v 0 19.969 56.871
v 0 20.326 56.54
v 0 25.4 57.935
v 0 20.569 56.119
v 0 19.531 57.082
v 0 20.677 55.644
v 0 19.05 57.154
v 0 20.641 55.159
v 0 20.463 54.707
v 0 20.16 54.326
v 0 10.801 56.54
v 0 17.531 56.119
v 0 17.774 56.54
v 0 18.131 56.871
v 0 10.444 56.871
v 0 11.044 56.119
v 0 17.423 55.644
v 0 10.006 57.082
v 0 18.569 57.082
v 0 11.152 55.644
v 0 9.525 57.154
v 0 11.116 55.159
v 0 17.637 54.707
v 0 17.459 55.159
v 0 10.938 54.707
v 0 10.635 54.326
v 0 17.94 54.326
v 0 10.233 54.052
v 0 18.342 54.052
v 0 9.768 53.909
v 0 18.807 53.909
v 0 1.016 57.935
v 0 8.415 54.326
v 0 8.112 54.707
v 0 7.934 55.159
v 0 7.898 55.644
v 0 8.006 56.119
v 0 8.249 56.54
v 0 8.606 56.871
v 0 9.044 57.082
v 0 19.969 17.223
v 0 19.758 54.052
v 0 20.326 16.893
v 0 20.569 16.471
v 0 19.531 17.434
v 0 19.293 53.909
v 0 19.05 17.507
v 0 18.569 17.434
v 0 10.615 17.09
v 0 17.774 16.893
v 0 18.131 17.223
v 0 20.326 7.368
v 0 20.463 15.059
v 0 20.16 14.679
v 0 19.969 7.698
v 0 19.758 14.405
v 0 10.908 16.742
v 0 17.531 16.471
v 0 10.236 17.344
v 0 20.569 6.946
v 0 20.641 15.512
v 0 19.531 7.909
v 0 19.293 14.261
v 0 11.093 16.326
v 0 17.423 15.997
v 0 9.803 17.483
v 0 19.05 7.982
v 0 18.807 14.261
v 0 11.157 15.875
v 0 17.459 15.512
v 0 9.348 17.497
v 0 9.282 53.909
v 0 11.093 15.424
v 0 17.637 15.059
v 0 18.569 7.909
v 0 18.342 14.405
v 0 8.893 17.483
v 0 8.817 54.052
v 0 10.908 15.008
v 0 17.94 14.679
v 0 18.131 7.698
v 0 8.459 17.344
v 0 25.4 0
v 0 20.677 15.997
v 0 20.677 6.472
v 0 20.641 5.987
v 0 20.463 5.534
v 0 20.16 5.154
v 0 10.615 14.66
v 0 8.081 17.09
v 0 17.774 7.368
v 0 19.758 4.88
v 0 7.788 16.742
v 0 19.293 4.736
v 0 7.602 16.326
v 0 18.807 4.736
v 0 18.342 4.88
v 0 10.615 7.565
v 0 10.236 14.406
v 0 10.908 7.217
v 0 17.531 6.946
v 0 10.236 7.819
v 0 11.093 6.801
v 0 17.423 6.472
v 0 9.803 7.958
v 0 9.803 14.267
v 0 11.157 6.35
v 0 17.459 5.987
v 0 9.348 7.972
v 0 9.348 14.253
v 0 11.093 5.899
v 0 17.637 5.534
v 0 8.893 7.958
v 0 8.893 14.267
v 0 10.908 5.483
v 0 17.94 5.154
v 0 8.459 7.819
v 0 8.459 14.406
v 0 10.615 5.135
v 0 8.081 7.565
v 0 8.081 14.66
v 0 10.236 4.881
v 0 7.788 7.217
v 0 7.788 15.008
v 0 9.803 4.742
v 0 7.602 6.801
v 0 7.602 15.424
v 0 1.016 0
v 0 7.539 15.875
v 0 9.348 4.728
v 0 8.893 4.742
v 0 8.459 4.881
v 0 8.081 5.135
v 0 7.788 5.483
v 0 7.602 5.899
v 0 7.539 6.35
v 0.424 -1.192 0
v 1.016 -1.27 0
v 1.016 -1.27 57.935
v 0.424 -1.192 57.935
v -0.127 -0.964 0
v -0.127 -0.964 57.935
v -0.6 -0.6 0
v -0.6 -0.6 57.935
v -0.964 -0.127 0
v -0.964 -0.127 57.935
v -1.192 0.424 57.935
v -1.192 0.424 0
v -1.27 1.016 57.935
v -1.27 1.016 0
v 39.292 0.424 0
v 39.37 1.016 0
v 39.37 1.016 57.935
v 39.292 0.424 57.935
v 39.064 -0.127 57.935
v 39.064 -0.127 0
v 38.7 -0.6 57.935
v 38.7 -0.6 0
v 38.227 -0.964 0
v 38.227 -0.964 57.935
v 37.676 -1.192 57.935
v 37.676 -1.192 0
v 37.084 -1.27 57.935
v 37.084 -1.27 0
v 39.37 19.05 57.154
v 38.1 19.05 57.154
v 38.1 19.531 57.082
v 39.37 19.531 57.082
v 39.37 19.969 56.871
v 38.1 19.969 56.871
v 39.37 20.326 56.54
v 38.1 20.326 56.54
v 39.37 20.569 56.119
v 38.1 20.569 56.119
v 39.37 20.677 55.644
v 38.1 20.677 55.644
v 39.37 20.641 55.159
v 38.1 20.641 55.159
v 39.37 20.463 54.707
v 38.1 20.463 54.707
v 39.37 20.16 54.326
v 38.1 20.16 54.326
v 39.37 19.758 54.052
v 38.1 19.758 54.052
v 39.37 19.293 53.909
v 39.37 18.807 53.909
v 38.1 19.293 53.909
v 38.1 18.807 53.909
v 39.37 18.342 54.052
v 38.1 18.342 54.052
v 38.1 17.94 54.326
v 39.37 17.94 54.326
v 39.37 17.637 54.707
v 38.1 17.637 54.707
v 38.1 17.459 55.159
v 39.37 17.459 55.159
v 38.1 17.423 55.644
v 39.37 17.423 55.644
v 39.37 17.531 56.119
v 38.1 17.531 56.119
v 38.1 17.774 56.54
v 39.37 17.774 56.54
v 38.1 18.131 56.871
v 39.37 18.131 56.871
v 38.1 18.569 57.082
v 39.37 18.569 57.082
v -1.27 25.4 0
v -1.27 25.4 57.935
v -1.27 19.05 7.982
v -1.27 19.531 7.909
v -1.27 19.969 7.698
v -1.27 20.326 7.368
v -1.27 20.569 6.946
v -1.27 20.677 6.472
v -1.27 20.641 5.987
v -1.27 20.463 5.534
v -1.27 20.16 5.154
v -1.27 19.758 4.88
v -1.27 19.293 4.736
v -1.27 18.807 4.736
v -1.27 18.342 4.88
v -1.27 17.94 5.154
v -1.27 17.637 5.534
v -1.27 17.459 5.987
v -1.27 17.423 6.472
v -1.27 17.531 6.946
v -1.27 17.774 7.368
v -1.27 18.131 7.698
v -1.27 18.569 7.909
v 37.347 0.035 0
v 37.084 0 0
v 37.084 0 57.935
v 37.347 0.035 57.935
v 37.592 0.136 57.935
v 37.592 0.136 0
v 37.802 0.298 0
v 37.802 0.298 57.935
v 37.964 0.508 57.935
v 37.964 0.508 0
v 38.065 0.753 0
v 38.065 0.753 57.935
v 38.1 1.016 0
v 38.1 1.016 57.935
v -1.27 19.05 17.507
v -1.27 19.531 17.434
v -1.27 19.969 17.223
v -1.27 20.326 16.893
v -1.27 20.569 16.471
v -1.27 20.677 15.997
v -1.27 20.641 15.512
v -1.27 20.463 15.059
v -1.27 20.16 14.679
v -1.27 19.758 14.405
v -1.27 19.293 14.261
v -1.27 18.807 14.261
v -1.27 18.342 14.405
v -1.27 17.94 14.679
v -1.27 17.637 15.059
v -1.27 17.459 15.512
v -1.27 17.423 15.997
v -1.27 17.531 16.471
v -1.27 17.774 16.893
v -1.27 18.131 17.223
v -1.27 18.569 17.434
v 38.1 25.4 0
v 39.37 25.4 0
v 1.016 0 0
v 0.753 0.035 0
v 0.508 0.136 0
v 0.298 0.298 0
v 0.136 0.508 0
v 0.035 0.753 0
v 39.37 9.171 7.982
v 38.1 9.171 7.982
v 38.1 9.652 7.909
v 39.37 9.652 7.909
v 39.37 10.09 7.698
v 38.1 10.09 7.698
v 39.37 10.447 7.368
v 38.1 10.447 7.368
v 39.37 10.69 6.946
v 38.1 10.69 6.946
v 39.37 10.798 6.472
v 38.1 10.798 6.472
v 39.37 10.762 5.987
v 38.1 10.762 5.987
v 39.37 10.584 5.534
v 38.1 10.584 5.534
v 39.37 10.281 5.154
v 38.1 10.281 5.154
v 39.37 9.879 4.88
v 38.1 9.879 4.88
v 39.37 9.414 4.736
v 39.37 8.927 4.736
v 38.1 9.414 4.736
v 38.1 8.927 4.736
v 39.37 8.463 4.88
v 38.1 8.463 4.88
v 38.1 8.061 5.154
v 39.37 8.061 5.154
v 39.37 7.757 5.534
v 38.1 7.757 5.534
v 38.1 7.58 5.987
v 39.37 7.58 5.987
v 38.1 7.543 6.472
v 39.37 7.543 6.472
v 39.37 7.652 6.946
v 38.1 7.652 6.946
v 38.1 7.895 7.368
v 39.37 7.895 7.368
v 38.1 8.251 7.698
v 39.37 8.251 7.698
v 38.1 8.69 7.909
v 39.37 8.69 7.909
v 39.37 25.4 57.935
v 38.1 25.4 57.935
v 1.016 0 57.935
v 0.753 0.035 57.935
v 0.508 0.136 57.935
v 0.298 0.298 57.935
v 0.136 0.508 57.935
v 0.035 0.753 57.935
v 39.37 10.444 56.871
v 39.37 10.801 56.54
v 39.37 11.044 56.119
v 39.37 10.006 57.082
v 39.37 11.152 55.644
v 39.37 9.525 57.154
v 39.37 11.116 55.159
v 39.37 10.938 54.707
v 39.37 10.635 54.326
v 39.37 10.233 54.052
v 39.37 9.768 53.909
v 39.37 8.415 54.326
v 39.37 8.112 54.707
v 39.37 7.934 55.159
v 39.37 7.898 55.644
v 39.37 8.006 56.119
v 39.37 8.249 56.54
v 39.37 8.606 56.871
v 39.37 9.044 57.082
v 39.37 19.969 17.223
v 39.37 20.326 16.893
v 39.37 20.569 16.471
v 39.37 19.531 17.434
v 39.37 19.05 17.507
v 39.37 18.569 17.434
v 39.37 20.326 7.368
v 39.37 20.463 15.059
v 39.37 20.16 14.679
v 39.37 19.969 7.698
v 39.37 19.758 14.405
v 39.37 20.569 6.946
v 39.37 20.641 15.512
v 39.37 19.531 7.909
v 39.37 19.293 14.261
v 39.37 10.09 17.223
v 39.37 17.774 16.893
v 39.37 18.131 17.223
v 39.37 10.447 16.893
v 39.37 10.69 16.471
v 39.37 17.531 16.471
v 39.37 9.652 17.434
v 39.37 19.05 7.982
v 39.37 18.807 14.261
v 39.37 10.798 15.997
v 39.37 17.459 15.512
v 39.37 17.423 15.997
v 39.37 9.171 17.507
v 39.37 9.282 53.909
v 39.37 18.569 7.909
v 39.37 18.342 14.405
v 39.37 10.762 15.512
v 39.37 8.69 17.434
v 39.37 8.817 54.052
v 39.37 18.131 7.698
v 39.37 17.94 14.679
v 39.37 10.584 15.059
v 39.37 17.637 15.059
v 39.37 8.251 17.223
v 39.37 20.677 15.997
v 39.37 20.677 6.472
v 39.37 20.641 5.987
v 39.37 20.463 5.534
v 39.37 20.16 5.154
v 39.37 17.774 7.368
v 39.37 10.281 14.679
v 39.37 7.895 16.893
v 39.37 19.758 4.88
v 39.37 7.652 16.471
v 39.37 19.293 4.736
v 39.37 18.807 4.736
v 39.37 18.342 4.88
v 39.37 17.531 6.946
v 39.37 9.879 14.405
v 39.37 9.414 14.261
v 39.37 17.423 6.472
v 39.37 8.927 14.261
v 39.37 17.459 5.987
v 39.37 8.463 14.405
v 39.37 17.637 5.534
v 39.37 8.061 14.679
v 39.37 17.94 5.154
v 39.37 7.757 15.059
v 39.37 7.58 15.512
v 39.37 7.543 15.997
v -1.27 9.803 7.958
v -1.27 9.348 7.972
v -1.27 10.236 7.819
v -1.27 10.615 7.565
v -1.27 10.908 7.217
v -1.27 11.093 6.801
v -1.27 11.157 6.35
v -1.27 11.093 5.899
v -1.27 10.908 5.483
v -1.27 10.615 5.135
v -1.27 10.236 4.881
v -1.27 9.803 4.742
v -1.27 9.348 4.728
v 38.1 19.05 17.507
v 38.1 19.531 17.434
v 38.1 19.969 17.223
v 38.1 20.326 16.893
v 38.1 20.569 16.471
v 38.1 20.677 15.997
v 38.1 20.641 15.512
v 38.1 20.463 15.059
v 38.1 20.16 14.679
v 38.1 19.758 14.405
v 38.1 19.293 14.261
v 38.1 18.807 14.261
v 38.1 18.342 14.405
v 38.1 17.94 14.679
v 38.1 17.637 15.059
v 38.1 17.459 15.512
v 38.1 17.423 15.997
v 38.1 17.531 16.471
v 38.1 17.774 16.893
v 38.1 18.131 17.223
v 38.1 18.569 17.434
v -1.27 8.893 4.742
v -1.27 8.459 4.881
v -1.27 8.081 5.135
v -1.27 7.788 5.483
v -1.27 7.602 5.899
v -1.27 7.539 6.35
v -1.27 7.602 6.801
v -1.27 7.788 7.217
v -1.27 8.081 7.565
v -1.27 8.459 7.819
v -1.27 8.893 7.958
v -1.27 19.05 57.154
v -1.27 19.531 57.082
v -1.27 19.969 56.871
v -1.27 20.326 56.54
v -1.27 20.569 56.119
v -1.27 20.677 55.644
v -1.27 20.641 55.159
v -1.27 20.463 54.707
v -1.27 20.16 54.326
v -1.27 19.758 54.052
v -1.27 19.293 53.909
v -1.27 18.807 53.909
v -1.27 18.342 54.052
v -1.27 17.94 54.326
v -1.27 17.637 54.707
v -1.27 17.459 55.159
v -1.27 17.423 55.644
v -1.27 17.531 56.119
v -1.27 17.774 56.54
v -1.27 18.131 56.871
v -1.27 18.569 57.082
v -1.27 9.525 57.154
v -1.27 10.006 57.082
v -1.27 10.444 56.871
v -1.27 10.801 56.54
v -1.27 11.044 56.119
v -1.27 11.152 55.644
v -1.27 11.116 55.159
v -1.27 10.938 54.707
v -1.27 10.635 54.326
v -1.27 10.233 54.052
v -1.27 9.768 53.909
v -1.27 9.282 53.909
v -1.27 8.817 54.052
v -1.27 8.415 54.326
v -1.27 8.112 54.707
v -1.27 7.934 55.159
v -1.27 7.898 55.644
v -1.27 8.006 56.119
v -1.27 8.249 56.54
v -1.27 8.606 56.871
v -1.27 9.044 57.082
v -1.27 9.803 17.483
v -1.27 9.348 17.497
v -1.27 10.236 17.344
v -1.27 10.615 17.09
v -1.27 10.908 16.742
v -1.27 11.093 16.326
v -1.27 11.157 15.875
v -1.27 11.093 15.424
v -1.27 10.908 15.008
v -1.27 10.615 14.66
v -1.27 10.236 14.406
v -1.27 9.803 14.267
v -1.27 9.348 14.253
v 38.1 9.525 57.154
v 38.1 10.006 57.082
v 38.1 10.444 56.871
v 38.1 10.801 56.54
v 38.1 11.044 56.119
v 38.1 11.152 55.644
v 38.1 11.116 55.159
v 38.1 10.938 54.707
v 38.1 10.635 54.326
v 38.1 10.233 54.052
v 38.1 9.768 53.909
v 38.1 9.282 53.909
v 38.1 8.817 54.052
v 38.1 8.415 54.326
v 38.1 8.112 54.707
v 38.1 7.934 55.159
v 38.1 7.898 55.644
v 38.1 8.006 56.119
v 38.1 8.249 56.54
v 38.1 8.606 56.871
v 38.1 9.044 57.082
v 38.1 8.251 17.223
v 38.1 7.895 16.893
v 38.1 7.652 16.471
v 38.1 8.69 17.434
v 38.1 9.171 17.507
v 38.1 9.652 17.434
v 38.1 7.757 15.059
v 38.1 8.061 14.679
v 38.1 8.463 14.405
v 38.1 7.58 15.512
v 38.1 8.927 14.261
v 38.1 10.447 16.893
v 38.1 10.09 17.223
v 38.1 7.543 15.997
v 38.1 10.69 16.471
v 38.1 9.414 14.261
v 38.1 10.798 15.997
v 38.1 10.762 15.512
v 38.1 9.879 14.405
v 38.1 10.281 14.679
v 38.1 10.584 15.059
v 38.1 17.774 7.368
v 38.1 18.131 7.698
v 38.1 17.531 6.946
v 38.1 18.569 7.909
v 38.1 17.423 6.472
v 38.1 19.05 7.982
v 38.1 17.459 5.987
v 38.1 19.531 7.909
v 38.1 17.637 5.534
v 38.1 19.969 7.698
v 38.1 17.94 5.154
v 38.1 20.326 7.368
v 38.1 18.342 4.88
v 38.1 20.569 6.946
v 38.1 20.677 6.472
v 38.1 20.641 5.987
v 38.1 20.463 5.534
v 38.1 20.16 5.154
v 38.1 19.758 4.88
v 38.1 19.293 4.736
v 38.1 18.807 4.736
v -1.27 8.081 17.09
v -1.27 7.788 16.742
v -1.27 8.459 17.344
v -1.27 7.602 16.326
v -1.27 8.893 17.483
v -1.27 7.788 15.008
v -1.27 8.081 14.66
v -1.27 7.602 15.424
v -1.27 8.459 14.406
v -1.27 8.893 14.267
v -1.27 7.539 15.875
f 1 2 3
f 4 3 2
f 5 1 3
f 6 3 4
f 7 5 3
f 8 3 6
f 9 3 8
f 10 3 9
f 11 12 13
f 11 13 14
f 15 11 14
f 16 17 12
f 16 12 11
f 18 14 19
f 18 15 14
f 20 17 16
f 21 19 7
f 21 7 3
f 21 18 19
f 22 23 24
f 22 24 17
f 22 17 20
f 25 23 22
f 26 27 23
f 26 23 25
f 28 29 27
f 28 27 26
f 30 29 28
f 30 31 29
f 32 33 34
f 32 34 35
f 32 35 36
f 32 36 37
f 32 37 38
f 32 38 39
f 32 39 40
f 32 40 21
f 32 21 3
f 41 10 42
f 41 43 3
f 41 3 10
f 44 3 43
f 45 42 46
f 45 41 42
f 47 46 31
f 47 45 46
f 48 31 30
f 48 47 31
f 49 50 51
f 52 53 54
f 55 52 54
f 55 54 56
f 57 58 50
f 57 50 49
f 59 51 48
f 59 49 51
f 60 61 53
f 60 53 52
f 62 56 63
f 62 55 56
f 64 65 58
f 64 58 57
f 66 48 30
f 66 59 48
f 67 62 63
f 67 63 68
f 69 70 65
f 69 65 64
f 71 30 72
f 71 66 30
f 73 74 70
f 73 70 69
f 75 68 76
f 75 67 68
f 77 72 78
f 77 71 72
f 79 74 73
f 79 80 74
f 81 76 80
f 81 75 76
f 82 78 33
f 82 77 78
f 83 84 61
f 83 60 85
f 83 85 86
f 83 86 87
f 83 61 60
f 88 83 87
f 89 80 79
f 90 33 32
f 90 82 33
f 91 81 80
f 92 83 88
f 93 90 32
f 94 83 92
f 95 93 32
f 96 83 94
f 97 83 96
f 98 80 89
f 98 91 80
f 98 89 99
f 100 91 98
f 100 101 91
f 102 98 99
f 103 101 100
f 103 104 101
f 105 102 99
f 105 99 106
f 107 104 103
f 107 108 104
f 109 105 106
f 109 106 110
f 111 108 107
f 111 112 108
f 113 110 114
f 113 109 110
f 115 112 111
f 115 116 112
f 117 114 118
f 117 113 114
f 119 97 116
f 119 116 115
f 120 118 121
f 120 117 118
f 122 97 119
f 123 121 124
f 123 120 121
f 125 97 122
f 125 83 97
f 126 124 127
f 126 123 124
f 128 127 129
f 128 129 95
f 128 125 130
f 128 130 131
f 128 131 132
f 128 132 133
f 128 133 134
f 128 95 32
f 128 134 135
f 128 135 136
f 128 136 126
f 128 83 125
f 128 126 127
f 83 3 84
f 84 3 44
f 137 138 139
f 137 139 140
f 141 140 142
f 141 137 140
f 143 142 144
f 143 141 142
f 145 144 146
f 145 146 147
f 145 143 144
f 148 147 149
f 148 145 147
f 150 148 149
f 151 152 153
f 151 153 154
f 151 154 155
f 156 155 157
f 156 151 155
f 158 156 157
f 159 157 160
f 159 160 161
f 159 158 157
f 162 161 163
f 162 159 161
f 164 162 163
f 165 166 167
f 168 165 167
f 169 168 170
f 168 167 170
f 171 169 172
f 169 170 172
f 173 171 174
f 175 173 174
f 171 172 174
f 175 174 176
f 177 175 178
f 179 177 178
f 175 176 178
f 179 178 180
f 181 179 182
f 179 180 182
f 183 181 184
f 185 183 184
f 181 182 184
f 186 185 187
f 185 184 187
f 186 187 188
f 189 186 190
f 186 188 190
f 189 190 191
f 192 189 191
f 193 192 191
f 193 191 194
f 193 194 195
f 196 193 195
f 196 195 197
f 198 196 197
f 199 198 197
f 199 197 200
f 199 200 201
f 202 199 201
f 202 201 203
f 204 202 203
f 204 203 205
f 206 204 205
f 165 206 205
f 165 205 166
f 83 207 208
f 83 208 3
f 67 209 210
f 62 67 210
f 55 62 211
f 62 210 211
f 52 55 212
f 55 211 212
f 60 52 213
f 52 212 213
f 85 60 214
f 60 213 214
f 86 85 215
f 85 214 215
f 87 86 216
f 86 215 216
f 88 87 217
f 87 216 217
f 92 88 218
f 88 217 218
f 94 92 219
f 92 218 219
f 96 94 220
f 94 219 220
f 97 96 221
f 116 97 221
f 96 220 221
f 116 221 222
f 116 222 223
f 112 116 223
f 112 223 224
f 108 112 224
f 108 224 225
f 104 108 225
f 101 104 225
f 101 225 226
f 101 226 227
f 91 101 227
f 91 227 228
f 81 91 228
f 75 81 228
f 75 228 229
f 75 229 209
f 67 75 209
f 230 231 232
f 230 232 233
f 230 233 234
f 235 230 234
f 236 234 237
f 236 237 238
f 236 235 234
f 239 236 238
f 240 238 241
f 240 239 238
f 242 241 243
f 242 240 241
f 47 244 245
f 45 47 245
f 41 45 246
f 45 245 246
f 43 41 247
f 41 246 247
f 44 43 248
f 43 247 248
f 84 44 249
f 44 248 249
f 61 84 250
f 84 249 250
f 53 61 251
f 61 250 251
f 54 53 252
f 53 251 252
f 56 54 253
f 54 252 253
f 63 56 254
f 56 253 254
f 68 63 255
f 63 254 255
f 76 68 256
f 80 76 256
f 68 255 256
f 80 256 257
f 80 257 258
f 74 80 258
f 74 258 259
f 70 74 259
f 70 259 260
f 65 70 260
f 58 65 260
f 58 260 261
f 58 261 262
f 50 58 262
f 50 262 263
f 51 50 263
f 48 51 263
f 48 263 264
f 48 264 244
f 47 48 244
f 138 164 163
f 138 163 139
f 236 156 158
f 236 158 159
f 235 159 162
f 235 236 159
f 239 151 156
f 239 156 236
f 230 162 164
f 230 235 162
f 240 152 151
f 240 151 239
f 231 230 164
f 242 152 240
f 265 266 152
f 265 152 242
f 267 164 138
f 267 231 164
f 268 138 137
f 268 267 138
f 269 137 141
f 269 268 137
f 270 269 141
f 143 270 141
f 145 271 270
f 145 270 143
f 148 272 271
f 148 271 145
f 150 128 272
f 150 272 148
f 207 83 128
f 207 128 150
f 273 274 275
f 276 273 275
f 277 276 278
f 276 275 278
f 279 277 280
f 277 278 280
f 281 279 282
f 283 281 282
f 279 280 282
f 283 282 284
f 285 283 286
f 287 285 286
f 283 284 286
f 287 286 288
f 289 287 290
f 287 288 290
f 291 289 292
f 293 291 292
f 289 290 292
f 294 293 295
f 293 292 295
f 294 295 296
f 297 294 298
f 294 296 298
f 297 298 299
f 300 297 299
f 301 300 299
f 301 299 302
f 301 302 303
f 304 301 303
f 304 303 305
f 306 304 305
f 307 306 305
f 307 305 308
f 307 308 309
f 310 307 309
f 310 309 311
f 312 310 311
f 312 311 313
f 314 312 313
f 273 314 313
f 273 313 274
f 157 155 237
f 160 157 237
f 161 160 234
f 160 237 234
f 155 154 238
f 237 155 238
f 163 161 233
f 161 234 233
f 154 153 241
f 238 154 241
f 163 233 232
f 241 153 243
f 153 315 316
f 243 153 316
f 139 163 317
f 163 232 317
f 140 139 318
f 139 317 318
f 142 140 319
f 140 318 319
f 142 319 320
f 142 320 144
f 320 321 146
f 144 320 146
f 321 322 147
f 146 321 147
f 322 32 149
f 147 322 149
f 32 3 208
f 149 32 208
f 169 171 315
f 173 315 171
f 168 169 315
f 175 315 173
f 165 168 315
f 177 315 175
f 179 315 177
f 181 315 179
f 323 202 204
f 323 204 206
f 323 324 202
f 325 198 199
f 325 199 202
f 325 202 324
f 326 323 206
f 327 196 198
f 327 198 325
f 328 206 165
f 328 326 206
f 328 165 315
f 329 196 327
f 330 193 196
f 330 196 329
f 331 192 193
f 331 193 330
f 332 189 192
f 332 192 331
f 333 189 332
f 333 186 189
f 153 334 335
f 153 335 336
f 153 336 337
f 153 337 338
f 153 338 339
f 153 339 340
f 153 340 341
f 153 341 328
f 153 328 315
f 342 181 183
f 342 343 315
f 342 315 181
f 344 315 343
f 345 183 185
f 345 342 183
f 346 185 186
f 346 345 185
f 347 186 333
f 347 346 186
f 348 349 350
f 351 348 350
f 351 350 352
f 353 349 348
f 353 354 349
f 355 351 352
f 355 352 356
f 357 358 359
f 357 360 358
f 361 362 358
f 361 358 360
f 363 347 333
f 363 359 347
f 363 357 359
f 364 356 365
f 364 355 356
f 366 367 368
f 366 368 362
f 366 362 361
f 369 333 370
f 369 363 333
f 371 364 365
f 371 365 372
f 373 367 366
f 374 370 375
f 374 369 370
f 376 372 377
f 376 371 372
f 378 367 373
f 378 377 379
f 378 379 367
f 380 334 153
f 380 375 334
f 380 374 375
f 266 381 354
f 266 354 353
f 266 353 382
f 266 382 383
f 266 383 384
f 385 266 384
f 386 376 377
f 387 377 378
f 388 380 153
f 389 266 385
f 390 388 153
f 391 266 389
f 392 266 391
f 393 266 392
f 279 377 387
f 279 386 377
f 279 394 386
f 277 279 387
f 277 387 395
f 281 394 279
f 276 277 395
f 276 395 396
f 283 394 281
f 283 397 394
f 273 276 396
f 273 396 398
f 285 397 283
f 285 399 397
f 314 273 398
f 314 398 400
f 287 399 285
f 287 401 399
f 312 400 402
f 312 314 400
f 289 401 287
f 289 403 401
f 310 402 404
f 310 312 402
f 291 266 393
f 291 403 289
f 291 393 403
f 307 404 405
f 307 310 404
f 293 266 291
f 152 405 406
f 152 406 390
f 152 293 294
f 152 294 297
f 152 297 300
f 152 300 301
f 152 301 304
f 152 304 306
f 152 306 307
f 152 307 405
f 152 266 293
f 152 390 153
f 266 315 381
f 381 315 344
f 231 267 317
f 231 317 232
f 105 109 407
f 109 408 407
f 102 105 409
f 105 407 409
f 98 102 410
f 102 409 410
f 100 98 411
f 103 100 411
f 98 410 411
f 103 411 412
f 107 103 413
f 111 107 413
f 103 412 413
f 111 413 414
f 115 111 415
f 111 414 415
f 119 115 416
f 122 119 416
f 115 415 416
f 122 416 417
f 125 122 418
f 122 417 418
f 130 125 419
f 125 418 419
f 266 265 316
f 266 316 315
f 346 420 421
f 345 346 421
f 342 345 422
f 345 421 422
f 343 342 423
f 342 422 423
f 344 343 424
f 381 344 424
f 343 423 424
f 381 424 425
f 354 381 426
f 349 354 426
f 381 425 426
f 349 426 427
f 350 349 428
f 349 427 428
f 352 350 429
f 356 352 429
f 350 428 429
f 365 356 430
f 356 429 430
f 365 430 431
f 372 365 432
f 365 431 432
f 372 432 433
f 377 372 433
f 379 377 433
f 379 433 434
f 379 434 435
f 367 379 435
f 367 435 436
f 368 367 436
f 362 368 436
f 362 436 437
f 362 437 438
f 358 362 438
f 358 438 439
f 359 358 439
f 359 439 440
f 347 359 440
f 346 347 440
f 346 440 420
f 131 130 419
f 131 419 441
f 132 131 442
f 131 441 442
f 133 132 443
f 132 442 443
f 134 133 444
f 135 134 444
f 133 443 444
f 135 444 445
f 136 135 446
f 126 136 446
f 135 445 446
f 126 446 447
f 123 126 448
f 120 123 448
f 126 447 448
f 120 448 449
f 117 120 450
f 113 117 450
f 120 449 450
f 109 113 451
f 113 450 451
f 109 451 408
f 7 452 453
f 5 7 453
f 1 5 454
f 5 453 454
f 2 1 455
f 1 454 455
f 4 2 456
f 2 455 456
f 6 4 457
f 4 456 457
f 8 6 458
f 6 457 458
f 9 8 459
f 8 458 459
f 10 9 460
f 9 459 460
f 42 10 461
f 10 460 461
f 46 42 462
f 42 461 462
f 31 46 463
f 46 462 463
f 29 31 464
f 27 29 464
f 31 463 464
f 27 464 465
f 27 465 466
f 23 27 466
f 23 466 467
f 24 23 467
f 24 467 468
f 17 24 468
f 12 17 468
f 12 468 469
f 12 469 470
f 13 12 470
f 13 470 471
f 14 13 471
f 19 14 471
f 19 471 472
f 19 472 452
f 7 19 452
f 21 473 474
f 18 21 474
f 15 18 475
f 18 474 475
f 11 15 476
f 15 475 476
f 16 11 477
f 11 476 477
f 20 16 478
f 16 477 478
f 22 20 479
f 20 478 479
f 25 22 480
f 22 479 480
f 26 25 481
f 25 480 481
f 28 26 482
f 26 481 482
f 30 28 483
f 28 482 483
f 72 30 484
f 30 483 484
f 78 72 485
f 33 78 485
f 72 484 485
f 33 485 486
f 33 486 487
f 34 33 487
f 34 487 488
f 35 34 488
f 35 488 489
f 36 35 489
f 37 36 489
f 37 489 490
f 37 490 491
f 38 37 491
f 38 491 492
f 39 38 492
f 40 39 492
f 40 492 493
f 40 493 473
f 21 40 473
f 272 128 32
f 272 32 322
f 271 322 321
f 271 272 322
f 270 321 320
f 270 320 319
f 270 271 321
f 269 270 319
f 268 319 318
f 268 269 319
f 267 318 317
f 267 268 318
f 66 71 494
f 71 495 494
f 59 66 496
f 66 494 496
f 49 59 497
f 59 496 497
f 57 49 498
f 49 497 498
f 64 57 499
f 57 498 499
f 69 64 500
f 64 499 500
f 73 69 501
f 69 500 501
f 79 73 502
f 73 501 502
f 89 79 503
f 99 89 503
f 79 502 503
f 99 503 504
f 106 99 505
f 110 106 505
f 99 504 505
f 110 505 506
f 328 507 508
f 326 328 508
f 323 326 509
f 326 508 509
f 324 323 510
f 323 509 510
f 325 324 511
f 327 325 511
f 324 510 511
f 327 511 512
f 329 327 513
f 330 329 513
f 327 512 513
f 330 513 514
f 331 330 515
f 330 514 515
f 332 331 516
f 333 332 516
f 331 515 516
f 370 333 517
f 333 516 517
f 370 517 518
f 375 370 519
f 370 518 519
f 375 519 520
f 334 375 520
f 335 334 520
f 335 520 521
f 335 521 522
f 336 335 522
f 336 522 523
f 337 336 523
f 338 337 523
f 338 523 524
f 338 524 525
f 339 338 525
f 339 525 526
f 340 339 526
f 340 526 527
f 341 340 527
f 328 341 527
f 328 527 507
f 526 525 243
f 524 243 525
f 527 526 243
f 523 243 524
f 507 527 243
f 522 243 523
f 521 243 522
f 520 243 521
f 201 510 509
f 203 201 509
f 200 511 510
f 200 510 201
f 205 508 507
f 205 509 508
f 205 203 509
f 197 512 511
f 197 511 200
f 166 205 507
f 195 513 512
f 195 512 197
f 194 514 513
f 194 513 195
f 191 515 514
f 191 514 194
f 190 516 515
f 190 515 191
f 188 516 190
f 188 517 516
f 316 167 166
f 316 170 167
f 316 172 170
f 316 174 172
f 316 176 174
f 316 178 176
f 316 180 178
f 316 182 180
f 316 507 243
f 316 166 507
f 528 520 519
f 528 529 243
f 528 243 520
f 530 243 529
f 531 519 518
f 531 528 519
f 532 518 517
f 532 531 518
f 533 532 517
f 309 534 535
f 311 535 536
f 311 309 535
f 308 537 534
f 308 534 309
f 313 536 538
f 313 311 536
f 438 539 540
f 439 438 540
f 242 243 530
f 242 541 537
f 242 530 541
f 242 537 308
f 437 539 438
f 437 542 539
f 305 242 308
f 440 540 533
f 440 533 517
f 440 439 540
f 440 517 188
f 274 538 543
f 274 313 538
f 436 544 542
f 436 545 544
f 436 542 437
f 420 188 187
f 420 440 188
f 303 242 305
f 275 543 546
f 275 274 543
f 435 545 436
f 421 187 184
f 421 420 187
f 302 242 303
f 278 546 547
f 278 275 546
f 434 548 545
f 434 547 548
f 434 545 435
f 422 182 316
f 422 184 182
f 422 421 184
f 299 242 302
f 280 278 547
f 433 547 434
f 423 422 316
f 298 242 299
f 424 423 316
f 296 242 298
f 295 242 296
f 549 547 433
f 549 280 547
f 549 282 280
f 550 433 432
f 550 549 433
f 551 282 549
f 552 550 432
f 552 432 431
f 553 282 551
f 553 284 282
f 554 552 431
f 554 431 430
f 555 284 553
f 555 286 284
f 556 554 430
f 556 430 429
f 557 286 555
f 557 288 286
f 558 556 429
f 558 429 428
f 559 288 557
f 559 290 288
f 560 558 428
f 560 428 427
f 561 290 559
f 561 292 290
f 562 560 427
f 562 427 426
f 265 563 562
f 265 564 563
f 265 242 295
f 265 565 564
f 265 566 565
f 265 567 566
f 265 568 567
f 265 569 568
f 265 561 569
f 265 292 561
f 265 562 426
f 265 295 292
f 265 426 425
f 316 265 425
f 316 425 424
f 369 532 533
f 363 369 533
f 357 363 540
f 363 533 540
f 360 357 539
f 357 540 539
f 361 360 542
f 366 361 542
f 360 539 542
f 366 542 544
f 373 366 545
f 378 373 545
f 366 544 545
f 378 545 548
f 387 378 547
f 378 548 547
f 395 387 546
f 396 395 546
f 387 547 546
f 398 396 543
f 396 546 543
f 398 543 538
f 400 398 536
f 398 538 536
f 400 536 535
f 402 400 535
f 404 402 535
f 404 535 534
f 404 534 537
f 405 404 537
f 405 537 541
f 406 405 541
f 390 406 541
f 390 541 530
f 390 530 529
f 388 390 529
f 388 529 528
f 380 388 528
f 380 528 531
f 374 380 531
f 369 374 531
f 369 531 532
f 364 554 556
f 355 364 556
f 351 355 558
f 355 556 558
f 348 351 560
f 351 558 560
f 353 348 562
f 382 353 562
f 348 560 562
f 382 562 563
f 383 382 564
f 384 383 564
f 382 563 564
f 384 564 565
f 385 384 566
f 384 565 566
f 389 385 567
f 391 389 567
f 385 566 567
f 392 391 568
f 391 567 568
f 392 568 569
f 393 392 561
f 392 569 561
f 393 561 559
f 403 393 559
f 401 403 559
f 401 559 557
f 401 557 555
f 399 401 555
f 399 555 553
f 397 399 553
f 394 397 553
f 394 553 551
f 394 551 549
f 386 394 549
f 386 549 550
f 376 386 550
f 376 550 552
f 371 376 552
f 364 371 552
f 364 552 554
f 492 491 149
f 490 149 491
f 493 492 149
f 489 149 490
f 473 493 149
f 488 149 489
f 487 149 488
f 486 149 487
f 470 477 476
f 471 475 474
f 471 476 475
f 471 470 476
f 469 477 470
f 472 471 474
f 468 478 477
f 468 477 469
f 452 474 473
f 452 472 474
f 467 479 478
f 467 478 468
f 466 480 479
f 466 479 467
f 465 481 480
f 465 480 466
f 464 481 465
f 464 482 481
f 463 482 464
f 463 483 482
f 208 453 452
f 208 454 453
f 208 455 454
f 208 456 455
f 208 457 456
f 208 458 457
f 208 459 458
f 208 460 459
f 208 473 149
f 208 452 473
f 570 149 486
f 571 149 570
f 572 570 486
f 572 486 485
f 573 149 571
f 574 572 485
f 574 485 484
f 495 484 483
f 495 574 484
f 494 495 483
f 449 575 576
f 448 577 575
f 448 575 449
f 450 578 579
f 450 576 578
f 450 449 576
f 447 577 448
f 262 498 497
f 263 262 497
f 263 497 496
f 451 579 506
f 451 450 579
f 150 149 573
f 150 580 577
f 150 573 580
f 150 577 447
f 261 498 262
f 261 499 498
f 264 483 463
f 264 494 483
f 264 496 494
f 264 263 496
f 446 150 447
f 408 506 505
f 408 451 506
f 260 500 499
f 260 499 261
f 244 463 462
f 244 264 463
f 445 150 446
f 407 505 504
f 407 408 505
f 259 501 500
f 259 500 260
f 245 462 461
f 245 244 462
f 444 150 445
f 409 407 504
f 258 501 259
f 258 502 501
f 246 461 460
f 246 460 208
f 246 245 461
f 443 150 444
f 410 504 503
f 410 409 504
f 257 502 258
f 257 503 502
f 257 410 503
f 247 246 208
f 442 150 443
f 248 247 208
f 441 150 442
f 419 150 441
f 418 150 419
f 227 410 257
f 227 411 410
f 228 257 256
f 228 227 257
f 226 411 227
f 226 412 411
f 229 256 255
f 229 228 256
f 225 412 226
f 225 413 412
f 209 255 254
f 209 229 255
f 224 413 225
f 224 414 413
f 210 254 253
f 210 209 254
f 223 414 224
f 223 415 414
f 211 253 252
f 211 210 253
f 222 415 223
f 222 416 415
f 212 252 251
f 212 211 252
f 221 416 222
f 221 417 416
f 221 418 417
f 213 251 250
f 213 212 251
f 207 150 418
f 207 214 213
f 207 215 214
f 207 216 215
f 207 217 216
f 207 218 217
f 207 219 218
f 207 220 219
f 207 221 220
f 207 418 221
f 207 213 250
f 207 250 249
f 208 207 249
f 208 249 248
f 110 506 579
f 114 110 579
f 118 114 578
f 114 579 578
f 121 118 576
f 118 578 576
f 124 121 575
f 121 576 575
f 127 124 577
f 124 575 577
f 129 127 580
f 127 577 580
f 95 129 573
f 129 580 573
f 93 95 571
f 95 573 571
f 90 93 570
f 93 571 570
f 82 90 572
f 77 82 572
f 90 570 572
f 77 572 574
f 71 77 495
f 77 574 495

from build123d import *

# Parameters (mm, degrees)
EXTRUDE_THIN1_DEPTH        = 57.935499968
F_4_CLEARANCE_HOLE1_REACH  = 115.405
F_4_CLEARANCE_HOLE1_BORE_R = 1.63195
F_4_CLEARANCE_HOLE2_D      = 3.2639
F_4_CLEARANCE_HOLE3_REACH  = 115.405
F_4_CLEARANCE_HOLE3_BORE_R = 1.63195
F_4_CLEARANCE_HOLE4_D      = 3.2639


with BuildPart() as part:
    # Sketch1 → Extrude-Thin1 (new body)
    with BuildSketch(Plane.XY):
        with BuildLine():
            Line((0, 25.4), (0, 1.016))
            ThreePointArc((0, 1.016), (0.29757951, 0.29757951), (1.016, 0))
            Line((1.016, 0), (37.084, 0))
            ThreePointArc((37.084, 0), (37.80242049, 0.29757951), (38.1, 1.016))
            Line((38.1, 1.016), (38.1, 25.4))
            Line((38.1, 25.4), (39.37, 25.4))
            Line((39.37, 25.4), (39.37, 1.016))
            ThreePointArc((39.37, 1.016), (38.700446102, -0.600446102), (37.084, -1.27))
            Line((37.084, -1.27), (1.016, -1.27))
            ThreePointArc((1.016, -1.27), (-0.600446102, -0.600446102), (-1.27, 1.016))
            Line((-1.27, 1.016), (-1.27, 25.4))
            Line((-1.27, 25.4), (0, 25.4))
        make_face()
    extrude(amount=EXTRUDE_THIN1_DEPTH)

    # #4 Clearance Hole1 bore → #4 Clearance Hole1 (cut, up to next)
    with BuildSketch(Plane(origin=(-1.27, -12.402043901, 98.894849861), x_dir=(0, 0, 1), z_dir=(-1, 0, 0)), mode=Mode.PRIVATE) as f_4_clearance_hole1_sk1:
        with Locations((-92.544849861, 31.452043901)):
            Circle(F_4_CLEARANCE_HOLE1_BORE_R)
    f_4_clearance_hole1_tool1 = extrude(f_4_clearance_hole1_sk1.sketch, amount=-F_4_CLEARANCE_HOLE1_REACH, mode=Mode.PRIVATE) & part.part
    # #4 Clearance Hole1 bore → #4 Clearance Hole1 (cut, up to next)
    with BuildSketch(Plane(origin=(-1.27, -12.402043901, 98.894849861), x_dir=(0, 0, 1), z_dir=(-1, 0, 0)), mode=Mode.PRIVATE) as f_4_clearance_hole1_sk2:
        with Locations((-83.019849861, 31.452043901)):
            Circle(F_4_CLEARANCE_HOLE1_BORE_R)
    f_4_clearance_hole1_tool2 = extrude(f_4_clearance_hole1_sk2.sketch, amount=-F_4_CLEARANCE_HOLE1_REACH, mode=Mode.PRIVATE) & part.part
    # #4 Clearance Hole1 bore → #4 Clearance Hole1 (cut, up to next)
    with BuildSketch(Plane(origin=(-1.27, -12.402043901, 98.894849861), x_dir=(0, 0, 1), z_dir=(-1, 0, 0)), mode=Mode.PRIVATE) as f_4_clearance_hole1_sk3:
        with Locations((-83.019849861, 21.927043901)):
            Circle(F_4_CLEARANCE_HOLE1_BORE_R)
    f_4_clearance_hole1_tool3 = extrude(f_4_clearance_hole1_sk3.sketch, amount=-F_4_CLEARANCE_HOLE1_REACH, mode=Mode.PRIVATE) & part.part
    # #4 Clearance Hole1 bore → #4 Clearance Hole1 (cut, up to next)
    with BuildSketch(Plane(origin=(-1.27, -12.402043901, 98.894849861), x_dir=(0, 0, 1), z_dir=(-1, 0, 0)), mode=Mode.PRIVATE) as f_4_clearance_hole1_sk4:
        with Locations((-92.544849861, 21.927043901)):
            Circle(F_4_CLEARANCE_HOLE1_BORE_R)
    f_4_clearance_hole1_tool4 = extrude(f_4_clearance_hole1_sk4.sketch, amount=-F_4_CLEARANCE_HOLE1_REACH, mode=Mode.PRIVATE) & part.part
    add(f_4_clearance_hole1_tool1.solids().sort_by_distance((-1.27, 19.05, 6.35))[0], mode=Mode.SUBTRACT)
    add(f_4_clearance_hole1_tool2.solids().sort_by_distance((-1.27, 19.05, 15.875))[0], mode=Mode.SUBTRACT)
    add(f_4_clearance_hole1_tool3.solids().sort_by_distance((-1.27, 9.525, 15.875))[0], mode=Mode.SUBTRACT)
    add(f_4_clearance_hole1_tool4.solids().sort_by_distance((-1.27, 9.525, 6.35))[0], mode=Mode.SUBTRACT)

    # #4 Clearance Hole2 (through all)
    with Locations(Plane(origin=(39.37, -12.402043901, 98.894849861), x_dir=(0, 0, -1), z_dir=(1, 0, 0))):
        with Locations((92.544849861, 31.452043901), (83.019849861, 31.452043901), (83.019849861, 21.57276521), (92.544849861, 21.57276521)):
            Hole(F_4_CLEARANCE_HOLE2_D / 2)

    # #4 Clearance Hole3 bore → #4 Clearance Hole3 (cut, up to next)
    with BuildSketch(Plane(origin=(-1.27, -12.402043901, 98.894849861), x_dir=(0, 0, 1), z_dir=(-1, 0, 0)), mode=Mode.PRIVATE) as f_4_clearance_hole3_sk1:
        with Locations((-43.372349893, 31.452043901)):
            Circle(F_4_CLEARANCE_HOLE3_BORE_R)
    f_4_clearance_hole3_tool1 = extrude(f_4_clearance_hole3_sk1.sketch, amount=-F_4_CLEARANCE_HOLE3_REACH, mode=Mode.PRIVATE) & part.part
    # #4 Clearance Hole3 bore → #4 Clearance Hole3 (cut, up to next)
    with BuildSketch(Plane(origin=(-1.27, -12.402043901, 98.894849861), x_dir=(0, 0, 1), z_dir=(-1, 0, 0)), mode=Mode.PRIVATE) as f_4_clearance_hole3_sk2:
        with Locations((-43.372349893, 21.927043901)):
            Circle(F_4_CLEARANCE_HOLE3_BORE_R)
    f_4_clearance_hole3_tool2 = extrude(f_4_clearance_hole3_sk2.sketch, amount=-F_4_CLEARANCE_HOLE3_REACH, mode=Mode.PRIVATE) & part.part
    add(f_4_clearance_hole3_tool1.solids().sort_by_distance((-1.27, 19.05, 55.5225))[0], mode=Mode.SUBTRACT)
    add(f_4_clearance_hole3_tool2.solids().sort_by_distance((-1.27, 9.525, 55.5225))[0], mode=Mode.SUBTRACT)

    # #4 Clearance Hole4 (through all)
    with Locations(Plane(origin=(39.37, -12.402043901, 98.894849861), x_dir=(0, 0, -1), z_dir=(1, 0, 0))):
        with Locations((43.372349893, 21.927043901), (43.372349893, 31.452043901)):
            Hole(F_4_CLEARANCE_HOLE4_D / 2)


solid = part.part
